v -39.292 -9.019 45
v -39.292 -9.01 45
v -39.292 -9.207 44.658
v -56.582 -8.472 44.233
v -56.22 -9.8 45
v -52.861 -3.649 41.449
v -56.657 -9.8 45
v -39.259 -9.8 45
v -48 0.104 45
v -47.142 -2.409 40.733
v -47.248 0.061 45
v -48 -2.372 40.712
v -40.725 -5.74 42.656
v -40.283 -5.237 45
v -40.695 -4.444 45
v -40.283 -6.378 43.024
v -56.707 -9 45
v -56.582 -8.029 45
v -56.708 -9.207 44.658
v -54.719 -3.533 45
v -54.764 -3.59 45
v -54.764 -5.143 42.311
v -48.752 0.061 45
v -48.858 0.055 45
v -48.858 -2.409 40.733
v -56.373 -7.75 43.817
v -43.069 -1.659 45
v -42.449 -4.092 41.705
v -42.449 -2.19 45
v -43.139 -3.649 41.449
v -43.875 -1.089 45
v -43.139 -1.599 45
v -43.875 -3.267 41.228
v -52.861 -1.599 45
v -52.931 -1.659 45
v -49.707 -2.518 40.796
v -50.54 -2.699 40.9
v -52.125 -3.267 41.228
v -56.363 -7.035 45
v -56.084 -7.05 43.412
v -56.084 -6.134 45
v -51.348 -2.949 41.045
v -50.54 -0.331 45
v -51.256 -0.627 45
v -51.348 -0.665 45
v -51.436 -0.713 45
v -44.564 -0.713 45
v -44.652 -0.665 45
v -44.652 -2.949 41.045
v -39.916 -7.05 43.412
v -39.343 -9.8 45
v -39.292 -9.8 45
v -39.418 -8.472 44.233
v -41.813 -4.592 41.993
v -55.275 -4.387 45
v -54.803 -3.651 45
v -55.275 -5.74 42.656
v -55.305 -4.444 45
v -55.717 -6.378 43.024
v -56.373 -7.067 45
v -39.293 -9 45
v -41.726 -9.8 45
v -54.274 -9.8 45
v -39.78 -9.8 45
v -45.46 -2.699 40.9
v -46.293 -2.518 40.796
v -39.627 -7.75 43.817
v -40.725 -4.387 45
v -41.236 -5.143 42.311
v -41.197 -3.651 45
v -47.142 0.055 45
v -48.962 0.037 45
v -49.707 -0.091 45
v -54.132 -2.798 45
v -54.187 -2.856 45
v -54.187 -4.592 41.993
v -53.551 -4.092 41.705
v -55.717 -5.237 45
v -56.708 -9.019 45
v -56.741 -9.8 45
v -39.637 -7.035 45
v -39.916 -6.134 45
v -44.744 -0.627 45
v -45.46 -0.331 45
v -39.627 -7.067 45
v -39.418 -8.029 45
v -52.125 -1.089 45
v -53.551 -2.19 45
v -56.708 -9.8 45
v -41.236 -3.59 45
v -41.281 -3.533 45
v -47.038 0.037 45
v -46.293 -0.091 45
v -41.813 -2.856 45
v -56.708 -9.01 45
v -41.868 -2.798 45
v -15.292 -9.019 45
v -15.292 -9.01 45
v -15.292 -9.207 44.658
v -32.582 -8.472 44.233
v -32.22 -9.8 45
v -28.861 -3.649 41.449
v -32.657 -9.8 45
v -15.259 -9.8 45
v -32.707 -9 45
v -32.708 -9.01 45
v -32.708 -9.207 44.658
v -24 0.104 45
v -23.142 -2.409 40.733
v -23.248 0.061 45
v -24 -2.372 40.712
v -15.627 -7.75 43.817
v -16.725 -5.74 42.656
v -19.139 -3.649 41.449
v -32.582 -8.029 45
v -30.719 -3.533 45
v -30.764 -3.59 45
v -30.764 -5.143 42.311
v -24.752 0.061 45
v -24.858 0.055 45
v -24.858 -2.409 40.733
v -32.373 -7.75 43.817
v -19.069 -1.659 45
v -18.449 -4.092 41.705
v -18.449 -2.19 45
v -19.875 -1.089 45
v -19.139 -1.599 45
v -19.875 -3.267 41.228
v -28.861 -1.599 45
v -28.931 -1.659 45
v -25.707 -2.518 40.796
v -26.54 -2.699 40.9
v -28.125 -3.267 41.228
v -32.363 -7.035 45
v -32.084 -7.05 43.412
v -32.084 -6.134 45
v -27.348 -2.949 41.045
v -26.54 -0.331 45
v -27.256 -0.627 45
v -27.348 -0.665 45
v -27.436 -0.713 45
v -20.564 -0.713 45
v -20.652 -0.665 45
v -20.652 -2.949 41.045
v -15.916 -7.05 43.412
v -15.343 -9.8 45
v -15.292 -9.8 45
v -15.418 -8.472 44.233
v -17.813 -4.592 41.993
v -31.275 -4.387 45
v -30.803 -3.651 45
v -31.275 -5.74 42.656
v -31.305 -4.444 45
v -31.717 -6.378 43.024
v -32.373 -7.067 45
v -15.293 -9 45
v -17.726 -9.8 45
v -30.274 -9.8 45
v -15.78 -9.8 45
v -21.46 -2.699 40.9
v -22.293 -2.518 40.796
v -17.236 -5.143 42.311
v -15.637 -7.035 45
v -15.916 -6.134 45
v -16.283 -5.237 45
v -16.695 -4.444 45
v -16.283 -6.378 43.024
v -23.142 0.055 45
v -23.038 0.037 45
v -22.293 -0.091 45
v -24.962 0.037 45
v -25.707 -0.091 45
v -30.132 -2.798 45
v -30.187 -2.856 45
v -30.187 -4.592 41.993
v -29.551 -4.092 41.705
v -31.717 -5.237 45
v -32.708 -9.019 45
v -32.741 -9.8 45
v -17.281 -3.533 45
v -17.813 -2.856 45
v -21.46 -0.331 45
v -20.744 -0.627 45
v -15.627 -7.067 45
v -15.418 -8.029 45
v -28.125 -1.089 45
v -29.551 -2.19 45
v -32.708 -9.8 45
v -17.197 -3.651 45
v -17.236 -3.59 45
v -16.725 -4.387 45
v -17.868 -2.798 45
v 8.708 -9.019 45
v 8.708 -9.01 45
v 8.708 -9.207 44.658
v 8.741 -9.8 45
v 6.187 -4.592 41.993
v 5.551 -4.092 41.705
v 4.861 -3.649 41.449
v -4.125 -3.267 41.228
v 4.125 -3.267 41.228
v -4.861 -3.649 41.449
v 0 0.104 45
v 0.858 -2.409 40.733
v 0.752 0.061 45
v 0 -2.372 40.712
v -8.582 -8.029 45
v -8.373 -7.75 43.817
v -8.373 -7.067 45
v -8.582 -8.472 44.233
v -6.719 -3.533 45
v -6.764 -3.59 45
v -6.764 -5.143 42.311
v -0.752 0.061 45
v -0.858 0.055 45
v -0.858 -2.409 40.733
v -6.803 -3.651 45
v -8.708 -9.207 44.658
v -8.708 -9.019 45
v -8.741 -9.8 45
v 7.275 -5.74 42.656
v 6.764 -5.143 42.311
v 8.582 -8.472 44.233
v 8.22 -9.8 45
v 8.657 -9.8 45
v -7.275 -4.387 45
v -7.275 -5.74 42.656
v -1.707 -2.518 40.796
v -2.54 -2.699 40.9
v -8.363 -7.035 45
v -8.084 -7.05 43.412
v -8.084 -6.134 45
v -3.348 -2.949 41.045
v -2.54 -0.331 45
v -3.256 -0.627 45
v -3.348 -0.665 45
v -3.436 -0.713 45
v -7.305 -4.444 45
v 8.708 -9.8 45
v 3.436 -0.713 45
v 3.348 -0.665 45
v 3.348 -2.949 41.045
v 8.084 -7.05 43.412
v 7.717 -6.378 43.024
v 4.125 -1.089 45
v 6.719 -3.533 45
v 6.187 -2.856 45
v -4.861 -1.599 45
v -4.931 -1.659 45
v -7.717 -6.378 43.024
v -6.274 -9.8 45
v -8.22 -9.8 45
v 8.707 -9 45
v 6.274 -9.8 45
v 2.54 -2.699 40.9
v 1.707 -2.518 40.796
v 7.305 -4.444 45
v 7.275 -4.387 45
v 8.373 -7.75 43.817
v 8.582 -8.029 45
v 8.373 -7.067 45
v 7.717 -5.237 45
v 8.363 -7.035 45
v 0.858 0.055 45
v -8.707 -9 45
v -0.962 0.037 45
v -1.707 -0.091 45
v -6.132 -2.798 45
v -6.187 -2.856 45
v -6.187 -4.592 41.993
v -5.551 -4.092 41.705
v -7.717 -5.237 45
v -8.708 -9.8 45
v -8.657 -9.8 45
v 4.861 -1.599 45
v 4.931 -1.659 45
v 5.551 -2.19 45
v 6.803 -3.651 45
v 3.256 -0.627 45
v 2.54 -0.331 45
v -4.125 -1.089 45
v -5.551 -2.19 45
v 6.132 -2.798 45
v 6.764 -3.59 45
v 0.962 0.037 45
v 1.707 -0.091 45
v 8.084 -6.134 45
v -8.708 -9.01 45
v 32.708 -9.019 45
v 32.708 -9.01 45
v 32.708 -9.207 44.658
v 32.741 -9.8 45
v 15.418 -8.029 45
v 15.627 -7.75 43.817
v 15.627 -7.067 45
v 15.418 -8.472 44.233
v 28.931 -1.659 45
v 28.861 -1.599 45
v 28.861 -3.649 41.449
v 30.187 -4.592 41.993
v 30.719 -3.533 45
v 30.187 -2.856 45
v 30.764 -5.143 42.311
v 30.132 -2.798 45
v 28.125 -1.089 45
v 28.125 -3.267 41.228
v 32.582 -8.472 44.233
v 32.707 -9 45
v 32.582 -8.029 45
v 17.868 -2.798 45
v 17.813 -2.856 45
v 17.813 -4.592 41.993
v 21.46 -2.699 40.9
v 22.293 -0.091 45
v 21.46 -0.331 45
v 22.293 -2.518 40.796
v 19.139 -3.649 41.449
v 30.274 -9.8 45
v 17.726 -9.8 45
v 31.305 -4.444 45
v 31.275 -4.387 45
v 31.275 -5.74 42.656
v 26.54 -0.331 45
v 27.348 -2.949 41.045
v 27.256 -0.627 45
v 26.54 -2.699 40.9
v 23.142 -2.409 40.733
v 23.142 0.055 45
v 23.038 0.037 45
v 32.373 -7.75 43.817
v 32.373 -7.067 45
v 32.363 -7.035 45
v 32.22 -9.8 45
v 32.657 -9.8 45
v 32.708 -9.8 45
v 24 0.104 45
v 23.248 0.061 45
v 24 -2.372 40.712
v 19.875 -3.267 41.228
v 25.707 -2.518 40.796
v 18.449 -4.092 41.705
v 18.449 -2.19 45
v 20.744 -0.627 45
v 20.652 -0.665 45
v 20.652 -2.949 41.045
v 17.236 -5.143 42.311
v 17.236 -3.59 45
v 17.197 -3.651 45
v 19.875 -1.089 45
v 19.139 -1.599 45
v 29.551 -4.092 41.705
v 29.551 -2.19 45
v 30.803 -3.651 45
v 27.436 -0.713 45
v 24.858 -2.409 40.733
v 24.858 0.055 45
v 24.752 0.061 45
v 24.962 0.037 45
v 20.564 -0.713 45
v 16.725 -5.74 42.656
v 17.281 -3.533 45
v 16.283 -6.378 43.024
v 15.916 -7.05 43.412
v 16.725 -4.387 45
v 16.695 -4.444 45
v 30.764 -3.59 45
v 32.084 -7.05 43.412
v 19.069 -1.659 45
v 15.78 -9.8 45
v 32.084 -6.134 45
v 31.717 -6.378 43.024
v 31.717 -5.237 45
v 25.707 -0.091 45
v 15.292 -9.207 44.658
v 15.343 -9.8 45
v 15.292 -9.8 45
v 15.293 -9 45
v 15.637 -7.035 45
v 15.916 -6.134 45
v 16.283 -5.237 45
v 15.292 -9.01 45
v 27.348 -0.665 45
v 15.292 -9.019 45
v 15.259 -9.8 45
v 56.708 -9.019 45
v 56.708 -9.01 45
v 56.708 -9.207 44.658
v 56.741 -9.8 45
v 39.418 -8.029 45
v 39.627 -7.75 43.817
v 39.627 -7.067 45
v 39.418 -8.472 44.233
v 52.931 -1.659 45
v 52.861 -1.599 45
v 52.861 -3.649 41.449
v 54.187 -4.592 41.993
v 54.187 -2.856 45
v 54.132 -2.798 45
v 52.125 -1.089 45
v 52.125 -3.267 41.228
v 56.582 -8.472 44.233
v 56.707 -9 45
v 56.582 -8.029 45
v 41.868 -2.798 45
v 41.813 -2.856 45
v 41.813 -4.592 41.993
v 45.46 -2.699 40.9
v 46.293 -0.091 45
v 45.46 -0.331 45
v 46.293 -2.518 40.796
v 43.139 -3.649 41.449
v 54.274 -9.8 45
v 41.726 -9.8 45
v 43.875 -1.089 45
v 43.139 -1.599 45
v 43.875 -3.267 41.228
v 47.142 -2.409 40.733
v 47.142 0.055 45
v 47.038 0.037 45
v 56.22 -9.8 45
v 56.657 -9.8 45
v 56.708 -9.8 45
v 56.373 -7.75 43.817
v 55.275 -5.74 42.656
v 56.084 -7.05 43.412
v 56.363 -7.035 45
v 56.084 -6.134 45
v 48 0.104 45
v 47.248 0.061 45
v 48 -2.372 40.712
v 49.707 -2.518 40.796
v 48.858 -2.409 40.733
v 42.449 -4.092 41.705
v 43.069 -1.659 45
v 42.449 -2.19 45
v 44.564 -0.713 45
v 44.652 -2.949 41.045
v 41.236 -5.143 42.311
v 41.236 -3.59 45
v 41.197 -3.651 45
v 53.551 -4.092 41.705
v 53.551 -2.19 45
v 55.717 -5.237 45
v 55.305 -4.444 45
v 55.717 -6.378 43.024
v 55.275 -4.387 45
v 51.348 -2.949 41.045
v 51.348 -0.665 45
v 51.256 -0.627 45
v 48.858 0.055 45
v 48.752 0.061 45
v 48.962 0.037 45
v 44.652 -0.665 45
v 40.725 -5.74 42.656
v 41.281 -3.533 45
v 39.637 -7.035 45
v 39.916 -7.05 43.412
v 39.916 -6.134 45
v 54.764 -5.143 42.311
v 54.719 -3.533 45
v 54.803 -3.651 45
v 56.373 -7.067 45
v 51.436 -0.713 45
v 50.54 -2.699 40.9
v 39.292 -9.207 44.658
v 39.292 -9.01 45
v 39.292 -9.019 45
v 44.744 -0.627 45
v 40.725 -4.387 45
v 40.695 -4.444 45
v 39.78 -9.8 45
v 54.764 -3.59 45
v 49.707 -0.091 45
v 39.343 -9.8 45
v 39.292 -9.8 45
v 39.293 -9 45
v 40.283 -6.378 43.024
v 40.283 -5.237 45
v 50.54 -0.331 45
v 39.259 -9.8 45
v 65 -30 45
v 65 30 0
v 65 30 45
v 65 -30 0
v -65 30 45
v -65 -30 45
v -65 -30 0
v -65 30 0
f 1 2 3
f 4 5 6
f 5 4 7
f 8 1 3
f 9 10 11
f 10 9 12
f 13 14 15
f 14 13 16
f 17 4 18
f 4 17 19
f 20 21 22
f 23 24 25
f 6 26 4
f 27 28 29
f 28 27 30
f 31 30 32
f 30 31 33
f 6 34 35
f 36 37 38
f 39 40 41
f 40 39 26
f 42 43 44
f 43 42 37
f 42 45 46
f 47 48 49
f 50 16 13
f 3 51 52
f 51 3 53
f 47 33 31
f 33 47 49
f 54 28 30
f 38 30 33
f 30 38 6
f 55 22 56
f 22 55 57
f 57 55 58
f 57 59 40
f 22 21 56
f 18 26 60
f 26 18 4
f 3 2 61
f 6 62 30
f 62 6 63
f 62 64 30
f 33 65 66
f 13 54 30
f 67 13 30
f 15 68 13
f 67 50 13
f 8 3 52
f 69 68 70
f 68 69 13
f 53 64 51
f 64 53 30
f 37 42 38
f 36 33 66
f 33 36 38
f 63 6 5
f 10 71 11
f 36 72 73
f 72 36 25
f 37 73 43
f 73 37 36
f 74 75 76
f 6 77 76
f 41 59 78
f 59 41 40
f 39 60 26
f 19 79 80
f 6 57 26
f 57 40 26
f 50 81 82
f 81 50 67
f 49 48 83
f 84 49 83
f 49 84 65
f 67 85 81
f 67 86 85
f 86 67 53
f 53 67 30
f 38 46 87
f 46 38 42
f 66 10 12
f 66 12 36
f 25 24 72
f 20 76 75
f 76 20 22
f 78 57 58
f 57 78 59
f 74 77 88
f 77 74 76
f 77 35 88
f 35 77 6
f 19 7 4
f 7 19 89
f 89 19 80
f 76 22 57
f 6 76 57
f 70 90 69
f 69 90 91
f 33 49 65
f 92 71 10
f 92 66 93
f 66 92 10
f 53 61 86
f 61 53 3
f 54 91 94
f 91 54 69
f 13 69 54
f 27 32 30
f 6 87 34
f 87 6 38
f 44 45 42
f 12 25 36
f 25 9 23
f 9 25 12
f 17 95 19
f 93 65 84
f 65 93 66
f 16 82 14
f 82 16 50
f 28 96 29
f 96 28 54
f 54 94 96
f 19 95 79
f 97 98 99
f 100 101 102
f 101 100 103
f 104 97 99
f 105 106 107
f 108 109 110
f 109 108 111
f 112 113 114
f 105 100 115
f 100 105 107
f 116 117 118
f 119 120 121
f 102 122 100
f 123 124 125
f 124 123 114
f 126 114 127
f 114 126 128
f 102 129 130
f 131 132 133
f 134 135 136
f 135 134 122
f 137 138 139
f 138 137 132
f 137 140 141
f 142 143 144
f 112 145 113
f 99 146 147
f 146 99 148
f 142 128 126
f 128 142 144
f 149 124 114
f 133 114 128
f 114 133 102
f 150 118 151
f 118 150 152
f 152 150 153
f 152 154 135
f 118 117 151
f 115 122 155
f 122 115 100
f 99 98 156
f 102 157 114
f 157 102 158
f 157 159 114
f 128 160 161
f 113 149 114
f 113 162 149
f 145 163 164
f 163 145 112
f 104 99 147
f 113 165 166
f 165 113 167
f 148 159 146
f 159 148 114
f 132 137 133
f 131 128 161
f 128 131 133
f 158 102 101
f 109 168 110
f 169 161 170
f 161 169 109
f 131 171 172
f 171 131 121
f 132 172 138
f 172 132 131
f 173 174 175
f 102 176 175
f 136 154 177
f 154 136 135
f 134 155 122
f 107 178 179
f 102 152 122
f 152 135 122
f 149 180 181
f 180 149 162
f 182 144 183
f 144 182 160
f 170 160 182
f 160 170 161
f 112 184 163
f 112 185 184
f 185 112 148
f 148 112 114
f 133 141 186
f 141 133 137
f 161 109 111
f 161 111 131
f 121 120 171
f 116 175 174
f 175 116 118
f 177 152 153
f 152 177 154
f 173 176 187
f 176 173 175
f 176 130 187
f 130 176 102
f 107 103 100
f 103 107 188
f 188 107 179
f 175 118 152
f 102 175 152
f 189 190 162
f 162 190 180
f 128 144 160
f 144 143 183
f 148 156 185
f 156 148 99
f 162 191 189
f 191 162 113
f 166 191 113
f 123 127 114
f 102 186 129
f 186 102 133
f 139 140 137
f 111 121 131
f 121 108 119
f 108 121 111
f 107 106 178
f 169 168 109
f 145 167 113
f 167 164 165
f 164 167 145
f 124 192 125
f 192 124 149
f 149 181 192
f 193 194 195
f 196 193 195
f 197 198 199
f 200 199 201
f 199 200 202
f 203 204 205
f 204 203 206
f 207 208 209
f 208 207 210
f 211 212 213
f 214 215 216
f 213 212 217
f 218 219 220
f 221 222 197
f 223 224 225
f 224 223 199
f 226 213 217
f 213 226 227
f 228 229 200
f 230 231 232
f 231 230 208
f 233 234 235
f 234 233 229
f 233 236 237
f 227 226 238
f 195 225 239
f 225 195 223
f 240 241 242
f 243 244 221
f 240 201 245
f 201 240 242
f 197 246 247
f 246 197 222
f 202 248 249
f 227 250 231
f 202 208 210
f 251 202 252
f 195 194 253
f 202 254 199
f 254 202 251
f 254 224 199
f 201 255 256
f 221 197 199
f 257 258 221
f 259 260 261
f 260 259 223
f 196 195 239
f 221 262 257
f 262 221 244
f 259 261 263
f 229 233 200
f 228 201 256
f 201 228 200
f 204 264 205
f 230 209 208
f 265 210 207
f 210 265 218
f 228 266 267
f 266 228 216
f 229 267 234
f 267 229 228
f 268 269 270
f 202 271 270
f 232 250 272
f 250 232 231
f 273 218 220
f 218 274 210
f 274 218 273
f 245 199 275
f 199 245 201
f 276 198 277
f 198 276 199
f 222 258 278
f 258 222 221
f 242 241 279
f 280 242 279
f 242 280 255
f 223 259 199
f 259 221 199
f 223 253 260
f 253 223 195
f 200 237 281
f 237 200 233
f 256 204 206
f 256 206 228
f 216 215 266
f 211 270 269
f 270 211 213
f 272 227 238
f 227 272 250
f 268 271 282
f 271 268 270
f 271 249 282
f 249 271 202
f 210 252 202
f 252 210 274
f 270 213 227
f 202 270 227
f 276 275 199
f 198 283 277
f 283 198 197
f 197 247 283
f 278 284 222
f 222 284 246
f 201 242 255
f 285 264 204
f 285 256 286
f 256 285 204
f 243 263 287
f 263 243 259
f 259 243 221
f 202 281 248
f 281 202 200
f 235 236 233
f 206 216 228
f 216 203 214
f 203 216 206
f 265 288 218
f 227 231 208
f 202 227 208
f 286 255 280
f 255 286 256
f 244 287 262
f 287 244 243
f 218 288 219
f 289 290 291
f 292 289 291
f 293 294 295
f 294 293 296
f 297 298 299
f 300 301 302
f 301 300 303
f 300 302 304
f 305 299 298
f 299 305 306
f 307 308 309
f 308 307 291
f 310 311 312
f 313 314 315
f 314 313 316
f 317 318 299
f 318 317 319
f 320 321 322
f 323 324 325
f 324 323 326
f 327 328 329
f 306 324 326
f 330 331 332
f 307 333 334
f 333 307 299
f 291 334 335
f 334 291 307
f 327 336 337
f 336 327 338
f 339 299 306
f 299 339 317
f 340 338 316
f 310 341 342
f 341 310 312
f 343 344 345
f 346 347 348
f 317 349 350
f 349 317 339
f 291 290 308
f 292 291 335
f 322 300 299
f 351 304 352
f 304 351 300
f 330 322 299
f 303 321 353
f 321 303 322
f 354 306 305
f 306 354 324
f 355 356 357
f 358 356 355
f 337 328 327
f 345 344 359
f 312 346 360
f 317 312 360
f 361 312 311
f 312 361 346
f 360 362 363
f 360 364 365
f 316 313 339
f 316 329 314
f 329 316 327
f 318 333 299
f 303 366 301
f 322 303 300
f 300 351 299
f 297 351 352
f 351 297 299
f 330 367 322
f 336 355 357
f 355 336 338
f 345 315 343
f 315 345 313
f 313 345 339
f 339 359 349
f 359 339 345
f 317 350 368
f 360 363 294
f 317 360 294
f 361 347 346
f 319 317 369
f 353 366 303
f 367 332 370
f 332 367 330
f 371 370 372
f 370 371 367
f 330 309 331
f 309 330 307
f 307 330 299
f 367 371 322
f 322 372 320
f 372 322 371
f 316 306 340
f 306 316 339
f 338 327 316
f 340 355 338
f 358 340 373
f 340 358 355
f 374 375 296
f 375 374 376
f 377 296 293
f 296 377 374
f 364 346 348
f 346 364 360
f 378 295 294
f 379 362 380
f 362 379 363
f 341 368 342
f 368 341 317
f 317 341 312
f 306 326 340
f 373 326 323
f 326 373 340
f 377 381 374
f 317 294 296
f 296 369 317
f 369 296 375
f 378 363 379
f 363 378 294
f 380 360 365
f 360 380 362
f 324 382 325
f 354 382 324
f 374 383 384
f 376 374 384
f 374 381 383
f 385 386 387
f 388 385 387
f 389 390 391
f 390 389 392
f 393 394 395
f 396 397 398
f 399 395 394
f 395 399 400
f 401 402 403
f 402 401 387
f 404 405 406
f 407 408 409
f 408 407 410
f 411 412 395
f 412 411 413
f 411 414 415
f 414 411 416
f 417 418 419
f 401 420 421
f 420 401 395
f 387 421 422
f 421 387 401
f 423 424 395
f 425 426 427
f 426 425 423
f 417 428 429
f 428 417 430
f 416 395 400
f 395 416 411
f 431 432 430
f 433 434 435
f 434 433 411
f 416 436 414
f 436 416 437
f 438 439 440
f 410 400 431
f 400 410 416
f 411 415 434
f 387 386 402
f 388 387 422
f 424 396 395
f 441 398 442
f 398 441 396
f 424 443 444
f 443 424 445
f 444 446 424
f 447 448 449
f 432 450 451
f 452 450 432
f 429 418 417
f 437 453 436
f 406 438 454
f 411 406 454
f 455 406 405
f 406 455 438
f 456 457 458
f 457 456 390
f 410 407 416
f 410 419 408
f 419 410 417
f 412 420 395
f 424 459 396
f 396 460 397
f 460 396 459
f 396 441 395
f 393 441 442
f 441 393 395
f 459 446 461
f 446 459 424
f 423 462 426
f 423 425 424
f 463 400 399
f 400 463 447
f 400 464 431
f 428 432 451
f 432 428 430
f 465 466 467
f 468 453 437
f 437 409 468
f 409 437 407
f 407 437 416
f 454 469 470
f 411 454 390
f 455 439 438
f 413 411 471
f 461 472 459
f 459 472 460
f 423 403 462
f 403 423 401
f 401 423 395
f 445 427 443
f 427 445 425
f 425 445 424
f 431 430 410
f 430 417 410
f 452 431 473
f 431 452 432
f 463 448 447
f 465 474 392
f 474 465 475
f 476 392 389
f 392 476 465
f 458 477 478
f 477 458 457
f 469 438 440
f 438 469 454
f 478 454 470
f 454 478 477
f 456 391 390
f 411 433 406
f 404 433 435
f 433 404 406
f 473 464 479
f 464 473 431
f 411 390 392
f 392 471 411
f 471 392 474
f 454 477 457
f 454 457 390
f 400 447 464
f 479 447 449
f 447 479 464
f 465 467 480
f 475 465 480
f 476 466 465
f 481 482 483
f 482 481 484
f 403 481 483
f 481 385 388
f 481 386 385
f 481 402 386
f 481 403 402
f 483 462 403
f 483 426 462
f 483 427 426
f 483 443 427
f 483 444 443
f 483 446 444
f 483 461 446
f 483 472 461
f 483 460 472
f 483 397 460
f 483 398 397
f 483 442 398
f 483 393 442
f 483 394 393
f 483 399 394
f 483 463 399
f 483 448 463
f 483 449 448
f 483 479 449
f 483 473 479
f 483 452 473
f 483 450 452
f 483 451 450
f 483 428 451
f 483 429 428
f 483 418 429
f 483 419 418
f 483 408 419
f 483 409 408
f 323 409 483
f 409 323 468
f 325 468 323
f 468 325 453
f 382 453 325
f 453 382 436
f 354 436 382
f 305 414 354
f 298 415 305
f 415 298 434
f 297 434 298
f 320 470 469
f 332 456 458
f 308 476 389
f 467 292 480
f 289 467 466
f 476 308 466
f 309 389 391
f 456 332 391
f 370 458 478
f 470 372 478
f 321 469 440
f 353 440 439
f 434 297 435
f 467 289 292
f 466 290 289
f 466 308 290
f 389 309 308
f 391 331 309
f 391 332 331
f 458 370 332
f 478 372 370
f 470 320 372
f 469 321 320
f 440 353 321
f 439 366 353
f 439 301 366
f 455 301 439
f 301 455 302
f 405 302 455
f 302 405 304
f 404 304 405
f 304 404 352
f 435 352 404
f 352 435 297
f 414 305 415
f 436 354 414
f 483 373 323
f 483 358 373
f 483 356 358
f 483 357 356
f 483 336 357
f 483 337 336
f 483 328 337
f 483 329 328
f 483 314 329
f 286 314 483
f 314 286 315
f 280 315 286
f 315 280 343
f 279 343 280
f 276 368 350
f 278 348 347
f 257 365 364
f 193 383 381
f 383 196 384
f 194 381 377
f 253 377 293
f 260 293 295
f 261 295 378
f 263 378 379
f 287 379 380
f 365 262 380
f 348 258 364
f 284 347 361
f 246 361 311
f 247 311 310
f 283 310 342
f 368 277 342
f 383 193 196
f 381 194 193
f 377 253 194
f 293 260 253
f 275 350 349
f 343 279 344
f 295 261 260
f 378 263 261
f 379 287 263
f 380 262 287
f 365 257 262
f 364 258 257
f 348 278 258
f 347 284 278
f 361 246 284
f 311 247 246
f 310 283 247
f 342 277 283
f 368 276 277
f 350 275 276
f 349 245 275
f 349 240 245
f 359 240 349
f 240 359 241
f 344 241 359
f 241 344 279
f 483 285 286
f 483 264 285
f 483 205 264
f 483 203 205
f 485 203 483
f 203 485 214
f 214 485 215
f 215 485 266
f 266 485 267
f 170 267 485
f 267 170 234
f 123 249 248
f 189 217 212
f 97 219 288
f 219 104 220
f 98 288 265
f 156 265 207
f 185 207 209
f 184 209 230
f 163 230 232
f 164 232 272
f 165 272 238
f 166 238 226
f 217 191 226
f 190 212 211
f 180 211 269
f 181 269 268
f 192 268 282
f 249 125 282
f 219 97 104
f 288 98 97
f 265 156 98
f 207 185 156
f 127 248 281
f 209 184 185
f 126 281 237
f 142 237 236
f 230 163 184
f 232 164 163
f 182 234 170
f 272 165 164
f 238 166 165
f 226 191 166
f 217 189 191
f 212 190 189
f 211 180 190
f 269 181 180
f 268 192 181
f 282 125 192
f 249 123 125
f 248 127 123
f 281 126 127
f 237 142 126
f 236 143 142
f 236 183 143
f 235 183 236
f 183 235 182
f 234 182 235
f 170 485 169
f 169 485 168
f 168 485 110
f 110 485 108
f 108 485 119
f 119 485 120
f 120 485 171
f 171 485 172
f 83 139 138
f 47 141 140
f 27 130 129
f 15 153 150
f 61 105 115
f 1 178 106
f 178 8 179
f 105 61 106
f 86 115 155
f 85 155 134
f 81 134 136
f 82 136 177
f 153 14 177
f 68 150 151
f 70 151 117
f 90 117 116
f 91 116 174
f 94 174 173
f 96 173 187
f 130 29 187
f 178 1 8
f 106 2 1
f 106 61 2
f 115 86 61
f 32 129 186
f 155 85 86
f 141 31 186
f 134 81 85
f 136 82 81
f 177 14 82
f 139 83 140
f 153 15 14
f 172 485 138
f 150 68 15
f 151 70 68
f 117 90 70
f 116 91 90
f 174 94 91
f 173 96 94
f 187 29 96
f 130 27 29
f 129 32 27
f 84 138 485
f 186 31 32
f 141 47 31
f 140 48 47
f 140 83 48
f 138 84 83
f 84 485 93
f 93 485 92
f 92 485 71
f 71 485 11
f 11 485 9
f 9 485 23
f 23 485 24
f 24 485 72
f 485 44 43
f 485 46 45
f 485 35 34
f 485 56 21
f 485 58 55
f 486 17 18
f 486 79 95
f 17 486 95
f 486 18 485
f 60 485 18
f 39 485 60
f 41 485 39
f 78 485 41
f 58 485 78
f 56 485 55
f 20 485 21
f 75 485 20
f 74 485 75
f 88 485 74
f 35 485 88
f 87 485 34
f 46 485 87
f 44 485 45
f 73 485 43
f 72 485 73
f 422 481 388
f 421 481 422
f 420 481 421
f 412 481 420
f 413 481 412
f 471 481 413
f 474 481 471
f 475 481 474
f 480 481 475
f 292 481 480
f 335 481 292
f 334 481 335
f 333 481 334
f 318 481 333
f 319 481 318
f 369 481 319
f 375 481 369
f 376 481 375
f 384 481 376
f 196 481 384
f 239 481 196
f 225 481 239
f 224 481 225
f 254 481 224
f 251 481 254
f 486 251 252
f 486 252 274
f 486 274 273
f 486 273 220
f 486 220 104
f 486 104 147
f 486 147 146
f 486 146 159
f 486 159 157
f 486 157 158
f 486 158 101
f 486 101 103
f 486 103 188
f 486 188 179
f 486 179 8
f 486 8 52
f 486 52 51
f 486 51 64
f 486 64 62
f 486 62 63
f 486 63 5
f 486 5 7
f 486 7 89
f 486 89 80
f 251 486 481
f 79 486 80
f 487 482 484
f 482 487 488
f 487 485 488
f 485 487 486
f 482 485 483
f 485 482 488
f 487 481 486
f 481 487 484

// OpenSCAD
// --- Parameters ---
// Block dimensions
block_x = 130;          // Length of the block (X)
block_y = 60;           // Depth of the block (Y)
block_z = 45;           // Height of the block (Z)

// Hole properties
hole_diameter = 17.5;   // Diameter of the conical tube holes
hole_depth = 40;        // Depth of the holes measured along their axis
hole_count = 5;         // Number of holes
hole_spacing = 24;      // Distance between hole centers along X
tilt_angle = 30;        // Tilt angle from vertical (YZ plane)

// Offset to center the holes along X
// The holes are centered on the block, so the middle hole is at X=0
// The sequence is: -(spacing*2), -(spacing*1), 0, +(spacing*1), +(spacing*2)
// We calculate the start position to ensure the whole group is centered.
hole_offset_x = (hole_spacing * (hole_count - 1)) / 2;

// Modeling constants
$fn = 64;               // Smoothness for cylinders
clearance = 0.1;        // Small clearance for boolean operations

// --- Main Model ---

// The block is centered on X and Y, resting on Z=0
// Since the user said "standing on the bed and centred on the origin in X and Y",
// and the block is 45mm tall, the Z range is [0, 45].
// To center X and Y, we translate the cube by [-block_x/2, -block_y/2, 0].

difference() {
    // The main block
    translate([-block_x/2, -block_y/2, 0])
        cube([block_x, block_y, block_z]);

    // The five blind holes
    for (i = [0 : hole_count - 1]) {
        // Calculate X position for this hole
        // Center of the block is 0. Holes are spaced 24mm apart.
        // We want the middle hole (index 2) to be at X=0.
        // X_pos = (i - (hole_count-1)/2) * hole_spacing
        // However, the user said "24mm apart along X and centred on the block".
        // This implies the group of holes is centered.
        x_pos = (i - (hole_count - 1) / 2) * hole_spacing;
        
        // The axis meets the top face at Y = -10.
        // The top face is at Z = block_z.
        // The tilt is 30 degrees from vertical in the YZ plane.
        // "Going down into the block, it moves toward +Y".
        // This means the tilt vector in YZ plane is (sin(30), -cos(30)).
        // Wait, if it moves toward +Y as it goes down (negative Z), 
        // the Y coordinate increases as Z decreases.
        
        // Let's define the center of the hole at the top face:
        top_y = -10;
        top_z = block_z;
        
        // We use a rotation and translation to place the cylinder.
        // The cylinder axis is tilted 30 degrees from vertical.
        // Vertical is (0, 0, -1). 
        // Tilted 30 deg towards +Y means the axis vector is (0, sin(30), -cos(30)).
        // In OpenSCAD, we rotate around X axis to tilt in YZ plane.
        
        translate([x_pos, top_y, top_z])
        rotate([-tilt_angle, 0, 0]) // Rotate around X to tilt in YZ plane
        // Note: A negative rotation around X tilts the Z-axis towards +Y.
        // Let's verify: rotate([-30, 0, 0]) of vector (0,0,-1) 
        // results in (0, sin(30), -cos(30)) -> (0, 0.5, -0.866).
        // This moves towards +Y as Z decreases. Correct.
        
        // We extend the cylinder slightly in Z to ensure a clean cut of the top face
        // and extend it downwards to ensure the "blind" bottom is clean.
        // Since it's a blind hole, we use a cylinder and the difference() handles the rest.
        // To make it a "flat end square to the axis", we just use a standard cylinder.
        // To ensure it cuts through the top, we translate it up slightly.
        translate([0, 0, clearance])
            cylinder(h = hole_depth + clearance, d = hole_diameter);
    }
}

// Note on orientation:
// The block is centered on X and Y.
// X range: [-65, 65]
// Y range: [-30, 30]
// Z range: [0, 45]
// Hole Y-intercept: -10
// Hole tilt: 30 degrees towards +Y as it goes down.
